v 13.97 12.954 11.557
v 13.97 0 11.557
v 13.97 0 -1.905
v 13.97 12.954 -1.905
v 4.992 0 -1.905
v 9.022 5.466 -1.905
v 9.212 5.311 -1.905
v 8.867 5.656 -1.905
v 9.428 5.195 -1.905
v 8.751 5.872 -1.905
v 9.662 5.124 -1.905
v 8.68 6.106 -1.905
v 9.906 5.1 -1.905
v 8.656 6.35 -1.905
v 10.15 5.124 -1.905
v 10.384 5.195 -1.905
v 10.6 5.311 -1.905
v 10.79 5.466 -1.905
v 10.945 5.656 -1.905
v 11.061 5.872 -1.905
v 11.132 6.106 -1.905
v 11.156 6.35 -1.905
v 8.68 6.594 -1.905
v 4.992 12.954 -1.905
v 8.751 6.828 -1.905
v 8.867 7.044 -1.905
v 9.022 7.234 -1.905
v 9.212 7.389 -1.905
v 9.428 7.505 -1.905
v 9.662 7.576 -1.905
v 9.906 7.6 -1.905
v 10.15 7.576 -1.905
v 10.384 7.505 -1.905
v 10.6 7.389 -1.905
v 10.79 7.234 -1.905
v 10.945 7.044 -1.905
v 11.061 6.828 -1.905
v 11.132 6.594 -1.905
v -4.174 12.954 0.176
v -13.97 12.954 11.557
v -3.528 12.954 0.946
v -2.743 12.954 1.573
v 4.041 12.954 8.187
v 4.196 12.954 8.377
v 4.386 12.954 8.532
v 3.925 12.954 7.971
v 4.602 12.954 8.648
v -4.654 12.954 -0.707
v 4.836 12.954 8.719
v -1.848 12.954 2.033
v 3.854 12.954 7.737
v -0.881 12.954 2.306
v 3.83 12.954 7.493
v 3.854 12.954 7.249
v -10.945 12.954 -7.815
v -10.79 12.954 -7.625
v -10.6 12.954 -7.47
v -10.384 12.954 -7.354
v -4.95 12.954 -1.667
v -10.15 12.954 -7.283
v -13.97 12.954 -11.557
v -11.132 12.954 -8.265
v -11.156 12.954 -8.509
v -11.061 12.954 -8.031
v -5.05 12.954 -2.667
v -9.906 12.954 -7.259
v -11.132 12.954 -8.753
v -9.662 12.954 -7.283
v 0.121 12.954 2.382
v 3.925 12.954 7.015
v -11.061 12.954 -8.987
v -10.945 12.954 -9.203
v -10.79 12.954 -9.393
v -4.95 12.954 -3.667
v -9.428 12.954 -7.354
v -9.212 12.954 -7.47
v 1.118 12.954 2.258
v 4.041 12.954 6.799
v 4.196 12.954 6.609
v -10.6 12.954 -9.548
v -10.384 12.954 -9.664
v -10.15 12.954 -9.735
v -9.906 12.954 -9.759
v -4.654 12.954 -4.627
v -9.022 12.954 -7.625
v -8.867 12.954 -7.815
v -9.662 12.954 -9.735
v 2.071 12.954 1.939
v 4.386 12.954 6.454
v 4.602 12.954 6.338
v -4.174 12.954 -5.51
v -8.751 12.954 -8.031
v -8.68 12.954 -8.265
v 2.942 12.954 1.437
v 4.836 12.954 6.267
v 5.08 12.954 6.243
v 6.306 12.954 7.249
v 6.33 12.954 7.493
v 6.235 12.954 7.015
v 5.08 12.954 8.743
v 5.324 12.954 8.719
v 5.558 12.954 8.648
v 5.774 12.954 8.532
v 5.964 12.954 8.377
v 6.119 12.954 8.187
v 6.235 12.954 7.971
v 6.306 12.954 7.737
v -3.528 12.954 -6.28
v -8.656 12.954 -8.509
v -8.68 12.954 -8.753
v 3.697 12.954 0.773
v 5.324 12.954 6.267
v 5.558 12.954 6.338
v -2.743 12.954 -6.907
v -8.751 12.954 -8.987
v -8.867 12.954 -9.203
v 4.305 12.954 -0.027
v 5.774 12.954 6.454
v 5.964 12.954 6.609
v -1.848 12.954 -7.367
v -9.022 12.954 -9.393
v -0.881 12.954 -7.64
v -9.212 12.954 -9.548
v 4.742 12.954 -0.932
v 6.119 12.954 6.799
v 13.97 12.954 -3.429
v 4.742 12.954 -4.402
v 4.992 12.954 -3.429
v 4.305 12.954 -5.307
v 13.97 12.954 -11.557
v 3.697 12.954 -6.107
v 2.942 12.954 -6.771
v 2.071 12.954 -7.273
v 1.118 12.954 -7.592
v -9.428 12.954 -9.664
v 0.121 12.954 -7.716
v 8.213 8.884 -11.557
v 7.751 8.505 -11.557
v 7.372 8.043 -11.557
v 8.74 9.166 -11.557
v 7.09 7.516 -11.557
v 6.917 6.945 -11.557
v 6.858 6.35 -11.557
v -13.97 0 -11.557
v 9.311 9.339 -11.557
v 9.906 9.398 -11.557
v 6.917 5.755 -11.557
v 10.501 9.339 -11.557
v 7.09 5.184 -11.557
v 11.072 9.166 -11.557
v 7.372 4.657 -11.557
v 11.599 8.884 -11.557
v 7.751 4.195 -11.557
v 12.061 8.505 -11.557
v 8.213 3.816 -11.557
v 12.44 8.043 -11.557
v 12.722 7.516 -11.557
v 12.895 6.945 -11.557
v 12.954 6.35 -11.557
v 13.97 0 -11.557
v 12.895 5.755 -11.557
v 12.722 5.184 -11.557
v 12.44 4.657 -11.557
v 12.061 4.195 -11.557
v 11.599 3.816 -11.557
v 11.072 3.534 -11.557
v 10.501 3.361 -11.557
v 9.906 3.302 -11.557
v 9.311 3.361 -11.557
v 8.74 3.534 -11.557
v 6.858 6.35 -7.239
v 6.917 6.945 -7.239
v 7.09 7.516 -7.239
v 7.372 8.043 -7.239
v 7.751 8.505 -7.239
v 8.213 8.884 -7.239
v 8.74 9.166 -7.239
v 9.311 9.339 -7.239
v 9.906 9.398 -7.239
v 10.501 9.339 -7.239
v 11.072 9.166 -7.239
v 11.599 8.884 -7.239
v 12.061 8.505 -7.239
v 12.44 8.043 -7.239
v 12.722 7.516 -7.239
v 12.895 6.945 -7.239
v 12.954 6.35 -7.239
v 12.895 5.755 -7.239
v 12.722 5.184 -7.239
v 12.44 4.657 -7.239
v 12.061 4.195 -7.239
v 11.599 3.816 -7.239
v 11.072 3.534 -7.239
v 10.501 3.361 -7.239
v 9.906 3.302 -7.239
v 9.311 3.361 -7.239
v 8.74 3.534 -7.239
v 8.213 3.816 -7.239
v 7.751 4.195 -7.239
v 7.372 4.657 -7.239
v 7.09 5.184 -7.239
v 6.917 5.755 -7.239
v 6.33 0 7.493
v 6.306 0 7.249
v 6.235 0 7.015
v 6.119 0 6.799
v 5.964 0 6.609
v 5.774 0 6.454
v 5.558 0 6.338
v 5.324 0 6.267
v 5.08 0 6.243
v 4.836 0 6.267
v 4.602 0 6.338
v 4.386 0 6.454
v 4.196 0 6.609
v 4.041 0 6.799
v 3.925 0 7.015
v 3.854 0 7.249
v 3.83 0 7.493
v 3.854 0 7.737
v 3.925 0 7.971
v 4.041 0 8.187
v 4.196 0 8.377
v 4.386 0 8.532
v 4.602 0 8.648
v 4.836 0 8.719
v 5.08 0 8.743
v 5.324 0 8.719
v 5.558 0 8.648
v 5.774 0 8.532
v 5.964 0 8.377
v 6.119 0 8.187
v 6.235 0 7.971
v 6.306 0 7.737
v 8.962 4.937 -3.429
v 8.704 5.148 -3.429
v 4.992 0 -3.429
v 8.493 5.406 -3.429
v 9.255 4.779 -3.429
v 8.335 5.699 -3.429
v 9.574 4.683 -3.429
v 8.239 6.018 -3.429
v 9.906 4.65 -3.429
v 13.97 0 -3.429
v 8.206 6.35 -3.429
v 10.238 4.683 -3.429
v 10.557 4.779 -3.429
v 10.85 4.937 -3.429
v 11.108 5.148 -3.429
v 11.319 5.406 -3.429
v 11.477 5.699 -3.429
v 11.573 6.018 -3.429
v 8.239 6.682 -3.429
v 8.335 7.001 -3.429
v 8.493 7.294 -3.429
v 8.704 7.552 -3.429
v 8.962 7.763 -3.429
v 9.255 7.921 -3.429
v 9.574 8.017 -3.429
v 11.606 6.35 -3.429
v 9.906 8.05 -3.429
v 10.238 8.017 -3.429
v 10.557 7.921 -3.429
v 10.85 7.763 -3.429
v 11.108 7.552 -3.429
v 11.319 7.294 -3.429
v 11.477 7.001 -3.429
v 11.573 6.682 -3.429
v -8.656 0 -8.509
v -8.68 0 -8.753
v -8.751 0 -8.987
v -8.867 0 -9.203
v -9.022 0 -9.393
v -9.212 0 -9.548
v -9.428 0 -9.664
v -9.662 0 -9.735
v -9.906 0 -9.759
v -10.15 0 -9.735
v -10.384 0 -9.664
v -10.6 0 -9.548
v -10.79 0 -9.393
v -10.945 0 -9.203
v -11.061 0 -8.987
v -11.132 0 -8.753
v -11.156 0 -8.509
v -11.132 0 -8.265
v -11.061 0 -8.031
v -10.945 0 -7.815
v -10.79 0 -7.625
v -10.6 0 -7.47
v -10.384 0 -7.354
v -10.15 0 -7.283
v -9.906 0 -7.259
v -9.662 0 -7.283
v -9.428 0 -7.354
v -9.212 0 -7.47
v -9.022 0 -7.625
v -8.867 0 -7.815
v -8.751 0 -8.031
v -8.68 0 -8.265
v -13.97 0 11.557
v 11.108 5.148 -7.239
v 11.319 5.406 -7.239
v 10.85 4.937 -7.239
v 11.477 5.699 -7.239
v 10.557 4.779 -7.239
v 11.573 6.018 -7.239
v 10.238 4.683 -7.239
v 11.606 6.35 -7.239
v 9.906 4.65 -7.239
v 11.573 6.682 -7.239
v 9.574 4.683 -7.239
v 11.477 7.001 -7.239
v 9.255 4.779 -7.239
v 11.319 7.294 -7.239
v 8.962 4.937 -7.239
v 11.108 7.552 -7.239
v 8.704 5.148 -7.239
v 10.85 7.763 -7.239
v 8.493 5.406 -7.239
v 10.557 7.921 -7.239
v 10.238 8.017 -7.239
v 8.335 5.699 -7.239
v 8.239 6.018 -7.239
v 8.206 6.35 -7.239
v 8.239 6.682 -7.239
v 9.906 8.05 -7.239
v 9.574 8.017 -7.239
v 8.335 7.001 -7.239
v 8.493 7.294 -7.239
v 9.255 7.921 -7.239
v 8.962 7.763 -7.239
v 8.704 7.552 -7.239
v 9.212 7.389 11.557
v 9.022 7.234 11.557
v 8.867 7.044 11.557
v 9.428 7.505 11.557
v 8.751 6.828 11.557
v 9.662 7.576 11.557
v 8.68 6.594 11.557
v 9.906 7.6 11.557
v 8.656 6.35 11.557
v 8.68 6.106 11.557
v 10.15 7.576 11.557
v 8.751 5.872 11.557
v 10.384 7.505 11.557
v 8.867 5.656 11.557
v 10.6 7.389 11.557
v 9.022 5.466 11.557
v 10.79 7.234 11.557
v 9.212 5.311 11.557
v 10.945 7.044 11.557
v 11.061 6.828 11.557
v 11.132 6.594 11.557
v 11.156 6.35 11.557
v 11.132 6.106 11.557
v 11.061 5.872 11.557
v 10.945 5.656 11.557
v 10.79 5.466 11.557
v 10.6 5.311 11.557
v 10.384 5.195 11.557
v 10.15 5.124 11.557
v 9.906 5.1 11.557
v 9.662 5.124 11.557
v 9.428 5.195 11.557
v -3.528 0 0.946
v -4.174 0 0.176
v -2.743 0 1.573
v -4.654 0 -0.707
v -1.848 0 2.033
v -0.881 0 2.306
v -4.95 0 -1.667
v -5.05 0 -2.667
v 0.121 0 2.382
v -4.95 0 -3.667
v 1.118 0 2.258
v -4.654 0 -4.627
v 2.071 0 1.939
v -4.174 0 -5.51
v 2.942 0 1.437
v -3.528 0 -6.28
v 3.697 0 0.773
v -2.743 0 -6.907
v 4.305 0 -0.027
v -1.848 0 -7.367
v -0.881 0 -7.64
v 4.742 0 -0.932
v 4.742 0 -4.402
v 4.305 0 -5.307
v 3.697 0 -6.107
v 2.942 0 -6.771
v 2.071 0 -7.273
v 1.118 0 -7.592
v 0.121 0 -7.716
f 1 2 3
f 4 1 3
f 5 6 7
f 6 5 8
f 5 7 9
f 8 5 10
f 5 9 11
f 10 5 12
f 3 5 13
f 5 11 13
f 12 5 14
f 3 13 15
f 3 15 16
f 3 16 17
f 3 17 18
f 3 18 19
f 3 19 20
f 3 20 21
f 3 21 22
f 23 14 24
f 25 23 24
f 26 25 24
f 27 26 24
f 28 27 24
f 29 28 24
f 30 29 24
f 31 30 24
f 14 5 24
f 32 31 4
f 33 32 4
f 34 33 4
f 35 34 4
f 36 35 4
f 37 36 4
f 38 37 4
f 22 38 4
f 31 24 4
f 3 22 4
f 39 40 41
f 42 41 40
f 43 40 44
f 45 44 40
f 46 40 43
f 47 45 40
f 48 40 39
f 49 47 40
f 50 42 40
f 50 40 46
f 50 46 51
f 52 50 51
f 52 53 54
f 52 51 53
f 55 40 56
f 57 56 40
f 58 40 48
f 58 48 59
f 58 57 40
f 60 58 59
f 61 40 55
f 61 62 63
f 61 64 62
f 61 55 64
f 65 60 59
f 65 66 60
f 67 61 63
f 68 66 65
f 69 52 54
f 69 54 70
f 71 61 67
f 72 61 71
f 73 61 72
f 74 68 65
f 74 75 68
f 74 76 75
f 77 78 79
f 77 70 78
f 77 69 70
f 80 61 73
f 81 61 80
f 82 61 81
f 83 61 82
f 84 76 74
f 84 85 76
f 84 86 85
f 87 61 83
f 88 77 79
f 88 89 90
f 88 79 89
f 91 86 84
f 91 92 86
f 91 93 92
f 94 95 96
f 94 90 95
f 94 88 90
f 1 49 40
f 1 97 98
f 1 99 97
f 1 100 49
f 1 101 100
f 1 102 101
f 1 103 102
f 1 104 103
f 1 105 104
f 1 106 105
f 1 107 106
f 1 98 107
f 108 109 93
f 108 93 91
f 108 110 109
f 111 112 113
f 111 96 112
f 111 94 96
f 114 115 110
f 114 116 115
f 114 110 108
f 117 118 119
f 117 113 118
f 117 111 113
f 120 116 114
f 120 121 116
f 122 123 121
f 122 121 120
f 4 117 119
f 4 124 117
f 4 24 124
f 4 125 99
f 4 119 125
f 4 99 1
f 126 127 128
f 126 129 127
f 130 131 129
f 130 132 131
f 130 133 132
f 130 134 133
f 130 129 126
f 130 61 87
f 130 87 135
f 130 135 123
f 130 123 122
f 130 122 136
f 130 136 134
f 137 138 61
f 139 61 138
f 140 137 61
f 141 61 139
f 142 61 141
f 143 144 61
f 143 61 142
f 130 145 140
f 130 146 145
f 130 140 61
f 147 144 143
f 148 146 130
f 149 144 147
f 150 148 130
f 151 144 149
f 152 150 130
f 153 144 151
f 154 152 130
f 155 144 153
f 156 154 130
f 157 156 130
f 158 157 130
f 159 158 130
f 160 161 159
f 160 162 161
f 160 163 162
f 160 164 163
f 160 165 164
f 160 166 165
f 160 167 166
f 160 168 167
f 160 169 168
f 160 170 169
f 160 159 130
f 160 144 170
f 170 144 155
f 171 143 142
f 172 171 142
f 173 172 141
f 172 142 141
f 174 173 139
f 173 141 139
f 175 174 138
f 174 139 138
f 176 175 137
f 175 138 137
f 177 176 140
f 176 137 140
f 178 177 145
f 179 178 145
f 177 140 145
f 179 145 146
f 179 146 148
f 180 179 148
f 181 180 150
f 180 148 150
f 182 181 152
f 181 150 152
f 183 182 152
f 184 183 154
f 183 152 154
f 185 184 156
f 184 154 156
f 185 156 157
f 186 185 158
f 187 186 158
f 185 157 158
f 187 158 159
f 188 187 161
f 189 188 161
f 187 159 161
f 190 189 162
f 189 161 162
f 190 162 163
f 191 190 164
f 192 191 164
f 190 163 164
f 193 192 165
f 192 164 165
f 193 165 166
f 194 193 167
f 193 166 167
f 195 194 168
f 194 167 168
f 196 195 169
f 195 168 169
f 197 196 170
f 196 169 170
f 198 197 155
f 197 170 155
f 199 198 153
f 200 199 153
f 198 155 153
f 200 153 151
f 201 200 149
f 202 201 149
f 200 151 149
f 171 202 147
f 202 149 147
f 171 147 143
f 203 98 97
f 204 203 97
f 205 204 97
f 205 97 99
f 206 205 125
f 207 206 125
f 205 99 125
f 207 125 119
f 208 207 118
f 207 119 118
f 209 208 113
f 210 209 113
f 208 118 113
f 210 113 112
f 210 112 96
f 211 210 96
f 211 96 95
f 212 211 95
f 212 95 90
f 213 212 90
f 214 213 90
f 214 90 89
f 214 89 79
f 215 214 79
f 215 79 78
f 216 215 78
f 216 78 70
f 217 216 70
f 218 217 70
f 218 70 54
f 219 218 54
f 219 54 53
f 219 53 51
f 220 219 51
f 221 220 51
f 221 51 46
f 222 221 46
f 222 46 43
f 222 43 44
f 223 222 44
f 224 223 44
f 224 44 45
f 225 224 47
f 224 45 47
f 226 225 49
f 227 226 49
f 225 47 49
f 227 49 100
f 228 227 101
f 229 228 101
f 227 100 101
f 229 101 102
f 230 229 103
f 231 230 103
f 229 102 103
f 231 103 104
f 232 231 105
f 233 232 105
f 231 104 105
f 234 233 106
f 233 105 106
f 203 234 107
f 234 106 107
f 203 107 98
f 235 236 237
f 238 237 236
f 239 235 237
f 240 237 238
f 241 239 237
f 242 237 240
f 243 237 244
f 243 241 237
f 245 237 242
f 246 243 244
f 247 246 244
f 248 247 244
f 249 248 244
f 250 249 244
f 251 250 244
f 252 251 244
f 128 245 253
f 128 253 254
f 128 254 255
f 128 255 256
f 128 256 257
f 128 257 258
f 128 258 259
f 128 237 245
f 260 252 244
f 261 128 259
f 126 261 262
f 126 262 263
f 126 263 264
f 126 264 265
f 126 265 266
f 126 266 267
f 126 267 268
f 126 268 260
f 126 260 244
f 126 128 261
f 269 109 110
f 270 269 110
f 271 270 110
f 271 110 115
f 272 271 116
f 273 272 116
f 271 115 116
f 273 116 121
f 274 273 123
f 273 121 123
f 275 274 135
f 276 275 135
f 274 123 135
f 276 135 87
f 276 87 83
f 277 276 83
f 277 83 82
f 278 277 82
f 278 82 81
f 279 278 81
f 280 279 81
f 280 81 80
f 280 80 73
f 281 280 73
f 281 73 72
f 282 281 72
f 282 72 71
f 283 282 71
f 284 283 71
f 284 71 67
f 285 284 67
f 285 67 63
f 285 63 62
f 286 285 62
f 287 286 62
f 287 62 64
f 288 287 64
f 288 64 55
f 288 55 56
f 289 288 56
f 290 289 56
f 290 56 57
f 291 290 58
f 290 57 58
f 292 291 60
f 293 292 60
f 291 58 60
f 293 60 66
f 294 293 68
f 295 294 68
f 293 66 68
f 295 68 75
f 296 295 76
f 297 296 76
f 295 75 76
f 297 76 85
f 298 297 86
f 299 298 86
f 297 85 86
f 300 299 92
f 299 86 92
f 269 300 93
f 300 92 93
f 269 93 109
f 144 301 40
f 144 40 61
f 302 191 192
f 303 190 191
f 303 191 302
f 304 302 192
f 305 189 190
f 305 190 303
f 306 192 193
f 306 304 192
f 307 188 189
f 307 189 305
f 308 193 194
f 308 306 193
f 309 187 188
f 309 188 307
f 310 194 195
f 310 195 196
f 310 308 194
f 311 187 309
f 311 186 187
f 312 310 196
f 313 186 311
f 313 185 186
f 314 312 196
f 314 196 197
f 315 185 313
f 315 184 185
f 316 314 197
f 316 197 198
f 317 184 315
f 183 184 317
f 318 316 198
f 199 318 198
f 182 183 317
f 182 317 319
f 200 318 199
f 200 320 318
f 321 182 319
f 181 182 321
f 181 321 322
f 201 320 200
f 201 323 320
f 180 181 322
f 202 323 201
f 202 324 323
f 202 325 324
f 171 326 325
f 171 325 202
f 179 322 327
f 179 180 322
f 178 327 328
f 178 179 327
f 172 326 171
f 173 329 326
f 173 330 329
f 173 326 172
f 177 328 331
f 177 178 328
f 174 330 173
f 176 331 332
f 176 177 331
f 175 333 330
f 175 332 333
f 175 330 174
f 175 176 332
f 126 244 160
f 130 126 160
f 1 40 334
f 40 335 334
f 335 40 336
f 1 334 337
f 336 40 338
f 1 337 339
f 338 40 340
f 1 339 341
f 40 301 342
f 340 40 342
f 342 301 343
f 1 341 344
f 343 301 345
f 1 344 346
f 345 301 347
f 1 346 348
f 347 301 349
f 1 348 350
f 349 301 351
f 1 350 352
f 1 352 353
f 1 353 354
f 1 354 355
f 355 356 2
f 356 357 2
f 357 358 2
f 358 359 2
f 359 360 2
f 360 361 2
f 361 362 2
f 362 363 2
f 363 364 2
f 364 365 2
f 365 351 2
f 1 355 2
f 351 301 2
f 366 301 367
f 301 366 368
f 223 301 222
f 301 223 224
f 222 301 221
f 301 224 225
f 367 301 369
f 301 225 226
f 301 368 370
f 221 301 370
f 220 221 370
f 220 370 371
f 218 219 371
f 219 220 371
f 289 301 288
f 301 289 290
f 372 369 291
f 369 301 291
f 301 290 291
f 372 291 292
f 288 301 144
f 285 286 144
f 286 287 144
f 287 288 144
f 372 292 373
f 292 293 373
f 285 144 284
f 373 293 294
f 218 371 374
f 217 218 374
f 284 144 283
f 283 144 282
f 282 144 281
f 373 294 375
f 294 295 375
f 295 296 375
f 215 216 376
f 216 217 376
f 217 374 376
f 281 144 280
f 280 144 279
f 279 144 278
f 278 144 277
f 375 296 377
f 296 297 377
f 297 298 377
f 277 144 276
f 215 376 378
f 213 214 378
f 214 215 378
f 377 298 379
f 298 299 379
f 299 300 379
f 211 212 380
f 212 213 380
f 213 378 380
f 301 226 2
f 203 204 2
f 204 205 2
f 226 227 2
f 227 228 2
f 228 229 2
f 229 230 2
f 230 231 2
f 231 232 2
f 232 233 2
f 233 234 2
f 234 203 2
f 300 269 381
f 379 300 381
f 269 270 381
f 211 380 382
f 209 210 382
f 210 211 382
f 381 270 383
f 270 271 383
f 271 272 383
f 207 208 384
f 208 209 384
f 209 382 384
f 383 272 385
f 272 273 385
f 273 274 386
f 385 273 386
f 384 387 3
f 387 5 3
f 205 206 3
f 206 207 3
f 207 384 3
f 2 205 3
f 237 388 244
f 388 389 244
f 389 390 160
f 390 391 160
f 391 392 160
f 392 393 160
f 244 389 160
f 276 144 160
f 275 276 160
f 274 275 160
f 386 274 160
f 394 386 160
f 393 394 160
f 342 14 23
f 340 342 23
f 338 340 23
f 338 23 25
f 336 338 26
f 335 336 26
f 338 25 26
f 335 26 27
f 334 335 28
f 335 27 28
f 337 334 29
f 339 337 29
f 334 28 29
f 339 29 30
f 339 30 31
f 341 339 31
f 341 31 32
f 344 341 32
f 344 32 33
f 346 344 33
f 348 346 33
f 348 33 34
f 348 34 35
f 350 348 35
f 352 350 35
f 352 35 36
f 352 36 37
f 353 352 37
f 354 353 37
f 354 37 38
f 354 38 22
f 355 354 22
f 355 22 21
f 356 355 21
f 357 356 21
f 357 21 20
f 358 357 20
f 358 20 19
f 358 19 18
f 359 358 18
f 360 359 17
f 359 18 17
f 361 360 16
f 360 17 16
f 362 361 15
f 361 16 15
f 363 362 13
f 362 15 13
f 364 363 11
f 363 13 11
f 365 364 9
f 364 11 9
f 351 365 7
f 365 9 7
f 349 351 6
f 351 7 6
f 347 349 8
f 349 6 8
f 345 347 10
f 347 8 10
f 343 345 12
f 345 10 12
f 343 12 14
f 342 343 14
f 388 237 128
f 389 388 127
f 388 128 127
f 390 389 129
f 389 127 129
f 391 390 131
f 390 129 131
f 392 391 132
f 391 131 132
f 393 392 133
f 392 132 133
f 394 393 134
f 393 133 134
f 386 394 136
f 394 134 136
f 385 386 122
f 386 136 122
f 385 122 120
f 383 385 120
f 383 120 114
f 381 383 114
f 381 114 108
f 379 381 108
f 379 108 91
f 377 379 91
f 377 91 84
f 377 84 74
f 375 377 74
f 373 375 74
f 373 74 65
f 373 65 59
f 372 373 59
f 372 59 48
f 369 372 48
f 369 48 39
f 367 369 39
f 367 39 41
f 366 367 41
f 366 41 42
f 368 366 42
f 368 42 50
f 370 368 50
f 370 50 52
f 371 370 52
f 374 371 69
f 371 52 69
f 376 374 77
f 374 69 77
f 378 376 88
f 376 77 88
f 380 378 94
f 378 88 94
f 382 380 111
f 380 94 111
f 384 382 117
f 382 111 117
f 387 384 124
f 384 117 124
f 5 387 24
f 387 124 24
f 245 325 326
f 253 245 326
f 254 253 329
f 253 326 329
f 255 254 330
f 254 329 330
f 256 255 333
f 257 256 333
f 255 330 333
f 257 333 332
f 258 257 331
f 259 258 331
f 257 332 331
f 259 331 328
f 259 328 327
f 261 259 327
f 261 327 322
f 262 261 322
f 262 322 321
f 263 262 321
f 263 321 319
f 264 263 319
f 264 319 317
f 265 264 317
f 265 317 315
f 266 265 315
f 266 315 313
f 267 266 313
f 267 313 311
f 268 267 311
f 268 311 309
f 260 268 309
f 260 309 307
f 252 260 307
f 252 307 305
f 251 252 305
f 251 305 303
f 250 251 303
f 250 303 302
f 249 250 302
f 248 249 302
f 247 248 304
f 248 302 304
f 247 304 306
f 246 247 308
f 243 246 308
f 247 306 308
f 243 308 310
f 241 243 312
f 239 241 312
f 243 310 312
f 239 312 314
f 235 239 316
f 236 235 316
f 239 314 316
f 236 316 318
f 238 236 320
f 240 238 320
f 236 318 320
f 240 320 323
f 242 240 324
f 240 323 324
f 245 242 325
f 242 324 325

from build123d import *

# Parameters (mm, degrees)
SKETCH1_W           = 27.94
SKETCH1_H           = 23.114
BOSS_EXTRUDE1_DEPTH = 12.954
SKETCH2_R           = 5.05
CUT_EXTRUDE1_DEPTH  = 13.954
SKETCH3_W           = 13.97
SKETCH3_H           = 1.524
CUT_EXTRUDE2_DEPTH  = 13.954
SKETCH4_R           = 1.25
CUT_EXTRUDE3_DEPTH  = 13.954
SKETCH5_R           = 3.048
CUT_EXTRUDE4_DEPTH  = 4.318
CUT_EXTRUDE5_REACH  = 20.796
SKETCH6_R           = 1.7
SKETCH7_R           = 1.25
CUT_EXTRUDE6_DEPTH  = 19.796


with BuildPart() as part:
    # Sketch1 → Boss-Extrude1 (new body)
    with BuildSketch(Plane(origin=(0, 0, 0), x_dir=(1, 0, 0), z_dir=(0, 1, 0))):
        Rectangle(SKETCH1_W, SKETCH1_H)
    extrude(amount=BOSS_EXTRUDE1_DEPTH)

    # Sketch2 → Cut-Extrude1 (cut, through all)
    with BuildSketch(Plane(origin=(0, 12.954, 0), x_dir=(1, 0, 0), z_dir=(0, 1, 0))):
        with Locations((0, 2.667)):
            Circle(SKETCH2_R)
    extrude(amount=-CUT_EXTRUDE1_DEPTH, mode=Mode.SUBTRACT)

    # Sketch3 → Cut-Extrude2 (cut, through all)
    with BuildSketch(Plane(origin=(0, 12.954, 0), x_dir=(1, 0, 0), z_dir=(0, 1, 0))):
        with Locations((6.985, 2.667)):
            Rectangle(SKETCH3_W, SKETCH3_H)
    extrude(amount=-CUT_EXTRUDE2_DEPTH, mode=Mode.SUBTRACT)

    # Sketch4 → Cut-Extrude3 (cut, through all)
    with BuildSketch(Plane(origin=(0, 12.954, 0), x_dir=(1, 0, 0), z_dir=(0, 1, 0))):
        with Locations((-9.906, 8.509)):
            Circle(SKETCH4_R)
        with Locations((5.08, -7.493)):
            Circle(SKETCH4_R)
    extrude(amount=-CUT_EXTRUDE3_DEPTH, mode=Mode.SUBTRACT)

    # Sketch5 → Cut-Extrude4 (cut)
    with BuildSketch(Plane(origin=(0, 0, -11.557), x_dir=(-1, 0, 0), z_dir=(0, 0, -1))):
        with Locations((-9.906, 6.35)):
            Circle(SKETCH5_R)
    extrude(amount=-CUT_EXTRUDE4_DEPTH, mode=Mode.SUBTRACT)

    # Sketch6 → Cut-Extrude5 (cut, up to next)
    with BuildSketch(Plane(origin=(0, 0, -7.239), x_dir=(-1, 0, 0), z_dir=(0, 0, -1)), mode=Mode.PRIVATE) as cut_extrude5_sk1:
        with Locations((-9.906, 6.35)):
            Circle(SKETCH6_R)
    cut_extrude5_tool1 = extrude(cut_extrude5_sk1.sketch, amount=-CUT_EXTRUDE5_REACH, mode=Mode.PRIVATE) & part.part
    add(cut_extrude5_tool1.solids().sort_by_distance((9.906, 6.35, -7.239))[0], mode=Mode.SUBTRACT)

    # Sketch7 → Cut-Extrude6 (cut, through all)
    with BuildSketch(Plane(origin=(0, 0, -7.239), x_dir=(-1, 0, 0), z_dir=(0, 0, -1))):
        with Locations((-9.906, 6.35)):
            Circle(SKETCH7_R)
    extrude(amount=-CUT_EXTRUDE6_DEPTH, mode=Mode.SUBTRACT)


solid = part.part
